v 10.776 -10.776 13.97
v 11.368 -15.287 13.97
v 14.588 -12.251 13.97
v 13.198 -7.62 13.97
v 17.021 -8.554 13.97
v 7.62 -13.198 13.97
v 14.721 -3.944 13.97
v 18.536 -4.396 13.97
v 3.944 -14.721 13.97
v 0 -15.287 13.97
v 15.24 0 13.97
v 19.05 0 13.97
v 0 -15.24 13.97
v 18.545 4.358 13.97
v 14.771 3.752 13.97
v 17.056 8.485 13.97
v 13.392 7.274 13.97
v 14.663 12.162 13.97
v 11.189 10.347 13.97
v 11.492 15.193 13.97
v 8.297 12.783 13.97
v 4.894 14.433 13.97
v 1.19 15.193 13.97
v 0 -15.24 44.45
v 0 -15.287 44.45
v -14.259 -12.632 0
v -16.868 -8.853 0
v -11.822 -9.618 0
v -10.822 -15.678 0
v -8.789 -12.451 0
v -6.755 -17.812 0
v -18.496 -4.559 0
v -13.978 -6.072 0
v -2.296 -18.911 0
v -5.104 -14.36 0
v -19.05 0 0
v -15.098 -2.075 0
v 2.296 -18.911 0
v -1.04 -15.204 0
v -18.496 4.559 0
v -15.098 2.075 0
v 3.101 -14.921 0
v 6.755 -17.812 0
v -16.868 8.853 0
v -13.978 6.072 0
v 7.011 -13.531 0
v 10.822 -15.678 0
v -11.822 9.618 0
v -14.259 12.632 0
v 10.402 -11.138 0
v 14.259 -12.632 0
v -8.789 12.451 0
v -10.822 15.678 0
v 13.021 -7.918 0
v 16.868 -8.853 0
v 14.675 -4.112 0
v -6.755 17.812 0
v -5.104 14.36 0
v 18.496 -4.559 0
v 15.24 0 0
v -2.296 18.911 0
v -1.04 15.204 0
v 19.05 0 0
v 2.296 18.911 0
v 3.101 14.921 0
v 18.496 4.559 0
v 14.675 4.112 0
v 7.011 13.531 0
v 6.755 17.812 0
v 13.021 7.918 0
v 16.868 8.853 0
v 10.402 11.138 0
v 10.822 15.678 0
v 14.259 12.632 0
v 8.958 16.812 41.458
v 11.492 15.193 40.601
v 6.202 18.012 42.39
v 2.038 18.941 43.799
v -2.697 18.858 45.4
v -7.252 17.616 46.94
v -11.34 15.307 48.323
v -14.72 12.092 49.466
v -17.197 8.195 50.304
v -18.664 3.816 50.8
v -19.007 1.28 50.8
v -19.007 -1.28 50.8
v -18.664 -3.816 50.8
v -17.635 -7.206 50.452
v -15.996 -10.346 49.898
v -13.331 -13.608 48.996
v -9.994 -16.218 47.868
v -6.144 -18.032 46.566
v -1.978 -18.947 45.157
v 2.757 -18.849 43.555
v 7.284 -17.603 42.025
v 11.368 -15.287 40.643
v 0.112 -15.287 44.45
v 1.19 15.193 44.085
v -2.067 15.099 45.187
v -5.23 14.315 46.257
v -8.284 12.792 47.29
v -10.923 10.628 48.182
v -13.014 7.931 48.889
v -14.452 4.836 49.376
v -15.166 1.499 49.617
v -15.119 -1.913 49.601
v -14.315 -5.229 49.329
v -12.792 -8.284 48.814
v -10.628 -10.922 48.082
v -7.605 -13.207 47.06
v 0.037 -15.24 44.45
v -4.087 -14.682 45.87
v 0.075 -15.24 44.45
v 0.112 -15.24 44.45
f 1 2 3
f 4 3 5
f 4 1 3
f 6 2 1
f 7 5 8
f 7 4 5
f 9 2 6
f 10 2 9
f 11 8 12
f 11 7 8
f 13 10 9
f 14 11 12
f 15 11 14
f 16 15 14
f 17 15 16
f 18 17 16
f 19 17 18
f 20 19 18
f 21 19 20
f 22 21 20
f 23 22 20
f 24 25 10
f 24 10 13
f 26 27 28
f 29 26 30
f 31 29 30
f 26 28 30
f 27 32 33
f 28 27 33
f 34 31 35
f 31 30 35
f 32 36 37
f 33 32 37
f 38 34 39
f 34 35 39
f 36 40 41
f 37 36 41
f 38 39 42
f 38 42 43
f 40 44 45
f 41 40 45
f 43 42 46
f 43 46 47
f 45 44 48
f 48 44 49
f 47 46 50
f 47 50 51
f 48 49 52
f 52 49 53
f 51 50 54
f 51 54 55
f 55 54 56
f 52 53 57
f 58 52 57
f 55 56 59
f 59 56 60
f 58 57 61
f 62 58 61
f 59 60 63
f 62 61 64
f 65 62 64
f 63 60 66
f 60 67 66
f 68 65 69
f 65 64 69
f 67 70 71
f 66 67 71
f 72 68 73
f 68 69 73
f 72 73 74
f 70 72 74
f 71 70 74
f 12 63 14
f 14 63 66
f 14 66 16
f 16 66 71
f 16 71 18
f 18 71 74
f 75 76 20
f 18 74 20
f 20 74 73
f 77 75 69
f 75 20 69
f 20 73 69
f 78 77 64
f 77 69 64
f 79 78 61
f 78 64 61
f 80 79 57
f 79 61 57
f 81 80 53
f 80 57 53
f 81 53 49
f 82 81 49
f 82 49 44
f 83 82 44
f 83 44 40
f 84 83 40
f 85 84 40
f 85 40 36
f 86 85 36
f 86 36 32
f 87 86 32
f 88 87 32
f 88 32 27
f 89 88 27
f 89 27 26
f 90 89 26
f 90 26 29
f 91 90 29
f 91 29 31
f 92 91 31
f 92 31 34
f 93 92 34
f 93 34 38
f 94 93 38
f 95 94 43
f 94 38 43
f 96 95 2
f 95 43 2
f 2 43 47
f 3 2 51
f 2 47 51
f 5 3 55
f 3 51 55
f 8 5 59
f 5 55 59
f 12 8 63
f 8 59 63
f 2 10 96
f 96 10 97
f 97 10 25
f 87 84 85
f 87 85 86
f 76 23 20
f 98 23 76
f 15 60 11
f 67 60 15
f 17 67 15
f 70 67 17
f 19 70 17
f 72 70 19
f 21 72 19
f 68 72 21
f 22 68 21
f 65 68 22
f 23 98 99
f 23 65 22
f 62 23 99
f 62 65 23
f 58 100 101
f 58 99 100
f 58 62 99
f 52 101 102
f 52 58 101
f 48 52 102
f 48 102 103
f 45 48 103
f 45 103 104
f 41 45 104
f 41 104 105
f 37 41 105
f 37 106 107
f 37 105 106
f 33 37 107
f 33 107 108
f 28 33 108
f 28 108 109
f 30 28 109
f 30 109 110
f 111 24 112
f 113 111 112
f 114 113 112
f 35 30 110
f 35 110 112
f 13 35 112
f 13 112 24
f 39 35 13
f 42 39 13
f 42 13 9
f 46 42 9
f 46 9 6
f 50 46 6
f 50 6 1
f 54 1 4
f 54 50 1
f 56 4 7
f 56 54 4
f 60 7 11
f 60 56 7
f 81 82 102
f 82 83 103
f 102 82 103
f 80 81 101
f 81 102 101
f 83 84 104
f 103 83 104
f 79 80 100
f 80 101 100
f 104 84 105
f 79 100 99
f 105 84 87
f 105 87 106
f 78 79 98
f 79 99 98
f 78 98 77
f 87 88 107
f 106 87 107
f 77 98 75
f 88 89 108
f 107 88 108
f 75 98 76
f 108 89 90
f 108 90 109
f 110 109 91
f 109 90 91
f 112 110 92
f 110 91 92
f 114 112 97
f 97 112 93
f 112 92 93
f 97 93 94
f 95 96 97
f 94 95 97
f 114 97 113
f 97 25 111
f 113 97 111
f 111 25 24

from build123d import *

# Parameters (mm, degrees)
F0_R     = 19.05
F0_R_2   = 15.24
F1_DEPTH = 50.8
F3_DEPTH = 25.4
F4_W     = 30.48
F4_H     = 30.48
F5_DEPTH = 25.4


with BuildPart() as f1:
    # F0 (on Top) → F1 (new body)
    with BuildSketch(Plane.XY):
        Circle(F0_R)
        Circle(F0_R_2, mode=Mode.SUBTRACT)
    extrude(amount=F1_DEPTH)

    # F2 (on Front) → F3 (cut, symmetric)
    with BuildSketch(Plane.XZ):
        Polygon((19.165186, 50.845042), (-19.072151, 50.938074), (19.165186, 38.006227), align=None)
    extrude(amount=F3_DEPTH, both=True, mode=Mode.SUBTRACT)

    # F4 (on Right) → F5 (cut)
    with BuildSketch(Plane.YZ):
        with Locations((-0.046517, 29.21)):
            Rectangle(F4_W, F4_H)
    extrude(amount=F5_DEPTH, mode=Mode.SUBTRACT)


solid = f1.part
